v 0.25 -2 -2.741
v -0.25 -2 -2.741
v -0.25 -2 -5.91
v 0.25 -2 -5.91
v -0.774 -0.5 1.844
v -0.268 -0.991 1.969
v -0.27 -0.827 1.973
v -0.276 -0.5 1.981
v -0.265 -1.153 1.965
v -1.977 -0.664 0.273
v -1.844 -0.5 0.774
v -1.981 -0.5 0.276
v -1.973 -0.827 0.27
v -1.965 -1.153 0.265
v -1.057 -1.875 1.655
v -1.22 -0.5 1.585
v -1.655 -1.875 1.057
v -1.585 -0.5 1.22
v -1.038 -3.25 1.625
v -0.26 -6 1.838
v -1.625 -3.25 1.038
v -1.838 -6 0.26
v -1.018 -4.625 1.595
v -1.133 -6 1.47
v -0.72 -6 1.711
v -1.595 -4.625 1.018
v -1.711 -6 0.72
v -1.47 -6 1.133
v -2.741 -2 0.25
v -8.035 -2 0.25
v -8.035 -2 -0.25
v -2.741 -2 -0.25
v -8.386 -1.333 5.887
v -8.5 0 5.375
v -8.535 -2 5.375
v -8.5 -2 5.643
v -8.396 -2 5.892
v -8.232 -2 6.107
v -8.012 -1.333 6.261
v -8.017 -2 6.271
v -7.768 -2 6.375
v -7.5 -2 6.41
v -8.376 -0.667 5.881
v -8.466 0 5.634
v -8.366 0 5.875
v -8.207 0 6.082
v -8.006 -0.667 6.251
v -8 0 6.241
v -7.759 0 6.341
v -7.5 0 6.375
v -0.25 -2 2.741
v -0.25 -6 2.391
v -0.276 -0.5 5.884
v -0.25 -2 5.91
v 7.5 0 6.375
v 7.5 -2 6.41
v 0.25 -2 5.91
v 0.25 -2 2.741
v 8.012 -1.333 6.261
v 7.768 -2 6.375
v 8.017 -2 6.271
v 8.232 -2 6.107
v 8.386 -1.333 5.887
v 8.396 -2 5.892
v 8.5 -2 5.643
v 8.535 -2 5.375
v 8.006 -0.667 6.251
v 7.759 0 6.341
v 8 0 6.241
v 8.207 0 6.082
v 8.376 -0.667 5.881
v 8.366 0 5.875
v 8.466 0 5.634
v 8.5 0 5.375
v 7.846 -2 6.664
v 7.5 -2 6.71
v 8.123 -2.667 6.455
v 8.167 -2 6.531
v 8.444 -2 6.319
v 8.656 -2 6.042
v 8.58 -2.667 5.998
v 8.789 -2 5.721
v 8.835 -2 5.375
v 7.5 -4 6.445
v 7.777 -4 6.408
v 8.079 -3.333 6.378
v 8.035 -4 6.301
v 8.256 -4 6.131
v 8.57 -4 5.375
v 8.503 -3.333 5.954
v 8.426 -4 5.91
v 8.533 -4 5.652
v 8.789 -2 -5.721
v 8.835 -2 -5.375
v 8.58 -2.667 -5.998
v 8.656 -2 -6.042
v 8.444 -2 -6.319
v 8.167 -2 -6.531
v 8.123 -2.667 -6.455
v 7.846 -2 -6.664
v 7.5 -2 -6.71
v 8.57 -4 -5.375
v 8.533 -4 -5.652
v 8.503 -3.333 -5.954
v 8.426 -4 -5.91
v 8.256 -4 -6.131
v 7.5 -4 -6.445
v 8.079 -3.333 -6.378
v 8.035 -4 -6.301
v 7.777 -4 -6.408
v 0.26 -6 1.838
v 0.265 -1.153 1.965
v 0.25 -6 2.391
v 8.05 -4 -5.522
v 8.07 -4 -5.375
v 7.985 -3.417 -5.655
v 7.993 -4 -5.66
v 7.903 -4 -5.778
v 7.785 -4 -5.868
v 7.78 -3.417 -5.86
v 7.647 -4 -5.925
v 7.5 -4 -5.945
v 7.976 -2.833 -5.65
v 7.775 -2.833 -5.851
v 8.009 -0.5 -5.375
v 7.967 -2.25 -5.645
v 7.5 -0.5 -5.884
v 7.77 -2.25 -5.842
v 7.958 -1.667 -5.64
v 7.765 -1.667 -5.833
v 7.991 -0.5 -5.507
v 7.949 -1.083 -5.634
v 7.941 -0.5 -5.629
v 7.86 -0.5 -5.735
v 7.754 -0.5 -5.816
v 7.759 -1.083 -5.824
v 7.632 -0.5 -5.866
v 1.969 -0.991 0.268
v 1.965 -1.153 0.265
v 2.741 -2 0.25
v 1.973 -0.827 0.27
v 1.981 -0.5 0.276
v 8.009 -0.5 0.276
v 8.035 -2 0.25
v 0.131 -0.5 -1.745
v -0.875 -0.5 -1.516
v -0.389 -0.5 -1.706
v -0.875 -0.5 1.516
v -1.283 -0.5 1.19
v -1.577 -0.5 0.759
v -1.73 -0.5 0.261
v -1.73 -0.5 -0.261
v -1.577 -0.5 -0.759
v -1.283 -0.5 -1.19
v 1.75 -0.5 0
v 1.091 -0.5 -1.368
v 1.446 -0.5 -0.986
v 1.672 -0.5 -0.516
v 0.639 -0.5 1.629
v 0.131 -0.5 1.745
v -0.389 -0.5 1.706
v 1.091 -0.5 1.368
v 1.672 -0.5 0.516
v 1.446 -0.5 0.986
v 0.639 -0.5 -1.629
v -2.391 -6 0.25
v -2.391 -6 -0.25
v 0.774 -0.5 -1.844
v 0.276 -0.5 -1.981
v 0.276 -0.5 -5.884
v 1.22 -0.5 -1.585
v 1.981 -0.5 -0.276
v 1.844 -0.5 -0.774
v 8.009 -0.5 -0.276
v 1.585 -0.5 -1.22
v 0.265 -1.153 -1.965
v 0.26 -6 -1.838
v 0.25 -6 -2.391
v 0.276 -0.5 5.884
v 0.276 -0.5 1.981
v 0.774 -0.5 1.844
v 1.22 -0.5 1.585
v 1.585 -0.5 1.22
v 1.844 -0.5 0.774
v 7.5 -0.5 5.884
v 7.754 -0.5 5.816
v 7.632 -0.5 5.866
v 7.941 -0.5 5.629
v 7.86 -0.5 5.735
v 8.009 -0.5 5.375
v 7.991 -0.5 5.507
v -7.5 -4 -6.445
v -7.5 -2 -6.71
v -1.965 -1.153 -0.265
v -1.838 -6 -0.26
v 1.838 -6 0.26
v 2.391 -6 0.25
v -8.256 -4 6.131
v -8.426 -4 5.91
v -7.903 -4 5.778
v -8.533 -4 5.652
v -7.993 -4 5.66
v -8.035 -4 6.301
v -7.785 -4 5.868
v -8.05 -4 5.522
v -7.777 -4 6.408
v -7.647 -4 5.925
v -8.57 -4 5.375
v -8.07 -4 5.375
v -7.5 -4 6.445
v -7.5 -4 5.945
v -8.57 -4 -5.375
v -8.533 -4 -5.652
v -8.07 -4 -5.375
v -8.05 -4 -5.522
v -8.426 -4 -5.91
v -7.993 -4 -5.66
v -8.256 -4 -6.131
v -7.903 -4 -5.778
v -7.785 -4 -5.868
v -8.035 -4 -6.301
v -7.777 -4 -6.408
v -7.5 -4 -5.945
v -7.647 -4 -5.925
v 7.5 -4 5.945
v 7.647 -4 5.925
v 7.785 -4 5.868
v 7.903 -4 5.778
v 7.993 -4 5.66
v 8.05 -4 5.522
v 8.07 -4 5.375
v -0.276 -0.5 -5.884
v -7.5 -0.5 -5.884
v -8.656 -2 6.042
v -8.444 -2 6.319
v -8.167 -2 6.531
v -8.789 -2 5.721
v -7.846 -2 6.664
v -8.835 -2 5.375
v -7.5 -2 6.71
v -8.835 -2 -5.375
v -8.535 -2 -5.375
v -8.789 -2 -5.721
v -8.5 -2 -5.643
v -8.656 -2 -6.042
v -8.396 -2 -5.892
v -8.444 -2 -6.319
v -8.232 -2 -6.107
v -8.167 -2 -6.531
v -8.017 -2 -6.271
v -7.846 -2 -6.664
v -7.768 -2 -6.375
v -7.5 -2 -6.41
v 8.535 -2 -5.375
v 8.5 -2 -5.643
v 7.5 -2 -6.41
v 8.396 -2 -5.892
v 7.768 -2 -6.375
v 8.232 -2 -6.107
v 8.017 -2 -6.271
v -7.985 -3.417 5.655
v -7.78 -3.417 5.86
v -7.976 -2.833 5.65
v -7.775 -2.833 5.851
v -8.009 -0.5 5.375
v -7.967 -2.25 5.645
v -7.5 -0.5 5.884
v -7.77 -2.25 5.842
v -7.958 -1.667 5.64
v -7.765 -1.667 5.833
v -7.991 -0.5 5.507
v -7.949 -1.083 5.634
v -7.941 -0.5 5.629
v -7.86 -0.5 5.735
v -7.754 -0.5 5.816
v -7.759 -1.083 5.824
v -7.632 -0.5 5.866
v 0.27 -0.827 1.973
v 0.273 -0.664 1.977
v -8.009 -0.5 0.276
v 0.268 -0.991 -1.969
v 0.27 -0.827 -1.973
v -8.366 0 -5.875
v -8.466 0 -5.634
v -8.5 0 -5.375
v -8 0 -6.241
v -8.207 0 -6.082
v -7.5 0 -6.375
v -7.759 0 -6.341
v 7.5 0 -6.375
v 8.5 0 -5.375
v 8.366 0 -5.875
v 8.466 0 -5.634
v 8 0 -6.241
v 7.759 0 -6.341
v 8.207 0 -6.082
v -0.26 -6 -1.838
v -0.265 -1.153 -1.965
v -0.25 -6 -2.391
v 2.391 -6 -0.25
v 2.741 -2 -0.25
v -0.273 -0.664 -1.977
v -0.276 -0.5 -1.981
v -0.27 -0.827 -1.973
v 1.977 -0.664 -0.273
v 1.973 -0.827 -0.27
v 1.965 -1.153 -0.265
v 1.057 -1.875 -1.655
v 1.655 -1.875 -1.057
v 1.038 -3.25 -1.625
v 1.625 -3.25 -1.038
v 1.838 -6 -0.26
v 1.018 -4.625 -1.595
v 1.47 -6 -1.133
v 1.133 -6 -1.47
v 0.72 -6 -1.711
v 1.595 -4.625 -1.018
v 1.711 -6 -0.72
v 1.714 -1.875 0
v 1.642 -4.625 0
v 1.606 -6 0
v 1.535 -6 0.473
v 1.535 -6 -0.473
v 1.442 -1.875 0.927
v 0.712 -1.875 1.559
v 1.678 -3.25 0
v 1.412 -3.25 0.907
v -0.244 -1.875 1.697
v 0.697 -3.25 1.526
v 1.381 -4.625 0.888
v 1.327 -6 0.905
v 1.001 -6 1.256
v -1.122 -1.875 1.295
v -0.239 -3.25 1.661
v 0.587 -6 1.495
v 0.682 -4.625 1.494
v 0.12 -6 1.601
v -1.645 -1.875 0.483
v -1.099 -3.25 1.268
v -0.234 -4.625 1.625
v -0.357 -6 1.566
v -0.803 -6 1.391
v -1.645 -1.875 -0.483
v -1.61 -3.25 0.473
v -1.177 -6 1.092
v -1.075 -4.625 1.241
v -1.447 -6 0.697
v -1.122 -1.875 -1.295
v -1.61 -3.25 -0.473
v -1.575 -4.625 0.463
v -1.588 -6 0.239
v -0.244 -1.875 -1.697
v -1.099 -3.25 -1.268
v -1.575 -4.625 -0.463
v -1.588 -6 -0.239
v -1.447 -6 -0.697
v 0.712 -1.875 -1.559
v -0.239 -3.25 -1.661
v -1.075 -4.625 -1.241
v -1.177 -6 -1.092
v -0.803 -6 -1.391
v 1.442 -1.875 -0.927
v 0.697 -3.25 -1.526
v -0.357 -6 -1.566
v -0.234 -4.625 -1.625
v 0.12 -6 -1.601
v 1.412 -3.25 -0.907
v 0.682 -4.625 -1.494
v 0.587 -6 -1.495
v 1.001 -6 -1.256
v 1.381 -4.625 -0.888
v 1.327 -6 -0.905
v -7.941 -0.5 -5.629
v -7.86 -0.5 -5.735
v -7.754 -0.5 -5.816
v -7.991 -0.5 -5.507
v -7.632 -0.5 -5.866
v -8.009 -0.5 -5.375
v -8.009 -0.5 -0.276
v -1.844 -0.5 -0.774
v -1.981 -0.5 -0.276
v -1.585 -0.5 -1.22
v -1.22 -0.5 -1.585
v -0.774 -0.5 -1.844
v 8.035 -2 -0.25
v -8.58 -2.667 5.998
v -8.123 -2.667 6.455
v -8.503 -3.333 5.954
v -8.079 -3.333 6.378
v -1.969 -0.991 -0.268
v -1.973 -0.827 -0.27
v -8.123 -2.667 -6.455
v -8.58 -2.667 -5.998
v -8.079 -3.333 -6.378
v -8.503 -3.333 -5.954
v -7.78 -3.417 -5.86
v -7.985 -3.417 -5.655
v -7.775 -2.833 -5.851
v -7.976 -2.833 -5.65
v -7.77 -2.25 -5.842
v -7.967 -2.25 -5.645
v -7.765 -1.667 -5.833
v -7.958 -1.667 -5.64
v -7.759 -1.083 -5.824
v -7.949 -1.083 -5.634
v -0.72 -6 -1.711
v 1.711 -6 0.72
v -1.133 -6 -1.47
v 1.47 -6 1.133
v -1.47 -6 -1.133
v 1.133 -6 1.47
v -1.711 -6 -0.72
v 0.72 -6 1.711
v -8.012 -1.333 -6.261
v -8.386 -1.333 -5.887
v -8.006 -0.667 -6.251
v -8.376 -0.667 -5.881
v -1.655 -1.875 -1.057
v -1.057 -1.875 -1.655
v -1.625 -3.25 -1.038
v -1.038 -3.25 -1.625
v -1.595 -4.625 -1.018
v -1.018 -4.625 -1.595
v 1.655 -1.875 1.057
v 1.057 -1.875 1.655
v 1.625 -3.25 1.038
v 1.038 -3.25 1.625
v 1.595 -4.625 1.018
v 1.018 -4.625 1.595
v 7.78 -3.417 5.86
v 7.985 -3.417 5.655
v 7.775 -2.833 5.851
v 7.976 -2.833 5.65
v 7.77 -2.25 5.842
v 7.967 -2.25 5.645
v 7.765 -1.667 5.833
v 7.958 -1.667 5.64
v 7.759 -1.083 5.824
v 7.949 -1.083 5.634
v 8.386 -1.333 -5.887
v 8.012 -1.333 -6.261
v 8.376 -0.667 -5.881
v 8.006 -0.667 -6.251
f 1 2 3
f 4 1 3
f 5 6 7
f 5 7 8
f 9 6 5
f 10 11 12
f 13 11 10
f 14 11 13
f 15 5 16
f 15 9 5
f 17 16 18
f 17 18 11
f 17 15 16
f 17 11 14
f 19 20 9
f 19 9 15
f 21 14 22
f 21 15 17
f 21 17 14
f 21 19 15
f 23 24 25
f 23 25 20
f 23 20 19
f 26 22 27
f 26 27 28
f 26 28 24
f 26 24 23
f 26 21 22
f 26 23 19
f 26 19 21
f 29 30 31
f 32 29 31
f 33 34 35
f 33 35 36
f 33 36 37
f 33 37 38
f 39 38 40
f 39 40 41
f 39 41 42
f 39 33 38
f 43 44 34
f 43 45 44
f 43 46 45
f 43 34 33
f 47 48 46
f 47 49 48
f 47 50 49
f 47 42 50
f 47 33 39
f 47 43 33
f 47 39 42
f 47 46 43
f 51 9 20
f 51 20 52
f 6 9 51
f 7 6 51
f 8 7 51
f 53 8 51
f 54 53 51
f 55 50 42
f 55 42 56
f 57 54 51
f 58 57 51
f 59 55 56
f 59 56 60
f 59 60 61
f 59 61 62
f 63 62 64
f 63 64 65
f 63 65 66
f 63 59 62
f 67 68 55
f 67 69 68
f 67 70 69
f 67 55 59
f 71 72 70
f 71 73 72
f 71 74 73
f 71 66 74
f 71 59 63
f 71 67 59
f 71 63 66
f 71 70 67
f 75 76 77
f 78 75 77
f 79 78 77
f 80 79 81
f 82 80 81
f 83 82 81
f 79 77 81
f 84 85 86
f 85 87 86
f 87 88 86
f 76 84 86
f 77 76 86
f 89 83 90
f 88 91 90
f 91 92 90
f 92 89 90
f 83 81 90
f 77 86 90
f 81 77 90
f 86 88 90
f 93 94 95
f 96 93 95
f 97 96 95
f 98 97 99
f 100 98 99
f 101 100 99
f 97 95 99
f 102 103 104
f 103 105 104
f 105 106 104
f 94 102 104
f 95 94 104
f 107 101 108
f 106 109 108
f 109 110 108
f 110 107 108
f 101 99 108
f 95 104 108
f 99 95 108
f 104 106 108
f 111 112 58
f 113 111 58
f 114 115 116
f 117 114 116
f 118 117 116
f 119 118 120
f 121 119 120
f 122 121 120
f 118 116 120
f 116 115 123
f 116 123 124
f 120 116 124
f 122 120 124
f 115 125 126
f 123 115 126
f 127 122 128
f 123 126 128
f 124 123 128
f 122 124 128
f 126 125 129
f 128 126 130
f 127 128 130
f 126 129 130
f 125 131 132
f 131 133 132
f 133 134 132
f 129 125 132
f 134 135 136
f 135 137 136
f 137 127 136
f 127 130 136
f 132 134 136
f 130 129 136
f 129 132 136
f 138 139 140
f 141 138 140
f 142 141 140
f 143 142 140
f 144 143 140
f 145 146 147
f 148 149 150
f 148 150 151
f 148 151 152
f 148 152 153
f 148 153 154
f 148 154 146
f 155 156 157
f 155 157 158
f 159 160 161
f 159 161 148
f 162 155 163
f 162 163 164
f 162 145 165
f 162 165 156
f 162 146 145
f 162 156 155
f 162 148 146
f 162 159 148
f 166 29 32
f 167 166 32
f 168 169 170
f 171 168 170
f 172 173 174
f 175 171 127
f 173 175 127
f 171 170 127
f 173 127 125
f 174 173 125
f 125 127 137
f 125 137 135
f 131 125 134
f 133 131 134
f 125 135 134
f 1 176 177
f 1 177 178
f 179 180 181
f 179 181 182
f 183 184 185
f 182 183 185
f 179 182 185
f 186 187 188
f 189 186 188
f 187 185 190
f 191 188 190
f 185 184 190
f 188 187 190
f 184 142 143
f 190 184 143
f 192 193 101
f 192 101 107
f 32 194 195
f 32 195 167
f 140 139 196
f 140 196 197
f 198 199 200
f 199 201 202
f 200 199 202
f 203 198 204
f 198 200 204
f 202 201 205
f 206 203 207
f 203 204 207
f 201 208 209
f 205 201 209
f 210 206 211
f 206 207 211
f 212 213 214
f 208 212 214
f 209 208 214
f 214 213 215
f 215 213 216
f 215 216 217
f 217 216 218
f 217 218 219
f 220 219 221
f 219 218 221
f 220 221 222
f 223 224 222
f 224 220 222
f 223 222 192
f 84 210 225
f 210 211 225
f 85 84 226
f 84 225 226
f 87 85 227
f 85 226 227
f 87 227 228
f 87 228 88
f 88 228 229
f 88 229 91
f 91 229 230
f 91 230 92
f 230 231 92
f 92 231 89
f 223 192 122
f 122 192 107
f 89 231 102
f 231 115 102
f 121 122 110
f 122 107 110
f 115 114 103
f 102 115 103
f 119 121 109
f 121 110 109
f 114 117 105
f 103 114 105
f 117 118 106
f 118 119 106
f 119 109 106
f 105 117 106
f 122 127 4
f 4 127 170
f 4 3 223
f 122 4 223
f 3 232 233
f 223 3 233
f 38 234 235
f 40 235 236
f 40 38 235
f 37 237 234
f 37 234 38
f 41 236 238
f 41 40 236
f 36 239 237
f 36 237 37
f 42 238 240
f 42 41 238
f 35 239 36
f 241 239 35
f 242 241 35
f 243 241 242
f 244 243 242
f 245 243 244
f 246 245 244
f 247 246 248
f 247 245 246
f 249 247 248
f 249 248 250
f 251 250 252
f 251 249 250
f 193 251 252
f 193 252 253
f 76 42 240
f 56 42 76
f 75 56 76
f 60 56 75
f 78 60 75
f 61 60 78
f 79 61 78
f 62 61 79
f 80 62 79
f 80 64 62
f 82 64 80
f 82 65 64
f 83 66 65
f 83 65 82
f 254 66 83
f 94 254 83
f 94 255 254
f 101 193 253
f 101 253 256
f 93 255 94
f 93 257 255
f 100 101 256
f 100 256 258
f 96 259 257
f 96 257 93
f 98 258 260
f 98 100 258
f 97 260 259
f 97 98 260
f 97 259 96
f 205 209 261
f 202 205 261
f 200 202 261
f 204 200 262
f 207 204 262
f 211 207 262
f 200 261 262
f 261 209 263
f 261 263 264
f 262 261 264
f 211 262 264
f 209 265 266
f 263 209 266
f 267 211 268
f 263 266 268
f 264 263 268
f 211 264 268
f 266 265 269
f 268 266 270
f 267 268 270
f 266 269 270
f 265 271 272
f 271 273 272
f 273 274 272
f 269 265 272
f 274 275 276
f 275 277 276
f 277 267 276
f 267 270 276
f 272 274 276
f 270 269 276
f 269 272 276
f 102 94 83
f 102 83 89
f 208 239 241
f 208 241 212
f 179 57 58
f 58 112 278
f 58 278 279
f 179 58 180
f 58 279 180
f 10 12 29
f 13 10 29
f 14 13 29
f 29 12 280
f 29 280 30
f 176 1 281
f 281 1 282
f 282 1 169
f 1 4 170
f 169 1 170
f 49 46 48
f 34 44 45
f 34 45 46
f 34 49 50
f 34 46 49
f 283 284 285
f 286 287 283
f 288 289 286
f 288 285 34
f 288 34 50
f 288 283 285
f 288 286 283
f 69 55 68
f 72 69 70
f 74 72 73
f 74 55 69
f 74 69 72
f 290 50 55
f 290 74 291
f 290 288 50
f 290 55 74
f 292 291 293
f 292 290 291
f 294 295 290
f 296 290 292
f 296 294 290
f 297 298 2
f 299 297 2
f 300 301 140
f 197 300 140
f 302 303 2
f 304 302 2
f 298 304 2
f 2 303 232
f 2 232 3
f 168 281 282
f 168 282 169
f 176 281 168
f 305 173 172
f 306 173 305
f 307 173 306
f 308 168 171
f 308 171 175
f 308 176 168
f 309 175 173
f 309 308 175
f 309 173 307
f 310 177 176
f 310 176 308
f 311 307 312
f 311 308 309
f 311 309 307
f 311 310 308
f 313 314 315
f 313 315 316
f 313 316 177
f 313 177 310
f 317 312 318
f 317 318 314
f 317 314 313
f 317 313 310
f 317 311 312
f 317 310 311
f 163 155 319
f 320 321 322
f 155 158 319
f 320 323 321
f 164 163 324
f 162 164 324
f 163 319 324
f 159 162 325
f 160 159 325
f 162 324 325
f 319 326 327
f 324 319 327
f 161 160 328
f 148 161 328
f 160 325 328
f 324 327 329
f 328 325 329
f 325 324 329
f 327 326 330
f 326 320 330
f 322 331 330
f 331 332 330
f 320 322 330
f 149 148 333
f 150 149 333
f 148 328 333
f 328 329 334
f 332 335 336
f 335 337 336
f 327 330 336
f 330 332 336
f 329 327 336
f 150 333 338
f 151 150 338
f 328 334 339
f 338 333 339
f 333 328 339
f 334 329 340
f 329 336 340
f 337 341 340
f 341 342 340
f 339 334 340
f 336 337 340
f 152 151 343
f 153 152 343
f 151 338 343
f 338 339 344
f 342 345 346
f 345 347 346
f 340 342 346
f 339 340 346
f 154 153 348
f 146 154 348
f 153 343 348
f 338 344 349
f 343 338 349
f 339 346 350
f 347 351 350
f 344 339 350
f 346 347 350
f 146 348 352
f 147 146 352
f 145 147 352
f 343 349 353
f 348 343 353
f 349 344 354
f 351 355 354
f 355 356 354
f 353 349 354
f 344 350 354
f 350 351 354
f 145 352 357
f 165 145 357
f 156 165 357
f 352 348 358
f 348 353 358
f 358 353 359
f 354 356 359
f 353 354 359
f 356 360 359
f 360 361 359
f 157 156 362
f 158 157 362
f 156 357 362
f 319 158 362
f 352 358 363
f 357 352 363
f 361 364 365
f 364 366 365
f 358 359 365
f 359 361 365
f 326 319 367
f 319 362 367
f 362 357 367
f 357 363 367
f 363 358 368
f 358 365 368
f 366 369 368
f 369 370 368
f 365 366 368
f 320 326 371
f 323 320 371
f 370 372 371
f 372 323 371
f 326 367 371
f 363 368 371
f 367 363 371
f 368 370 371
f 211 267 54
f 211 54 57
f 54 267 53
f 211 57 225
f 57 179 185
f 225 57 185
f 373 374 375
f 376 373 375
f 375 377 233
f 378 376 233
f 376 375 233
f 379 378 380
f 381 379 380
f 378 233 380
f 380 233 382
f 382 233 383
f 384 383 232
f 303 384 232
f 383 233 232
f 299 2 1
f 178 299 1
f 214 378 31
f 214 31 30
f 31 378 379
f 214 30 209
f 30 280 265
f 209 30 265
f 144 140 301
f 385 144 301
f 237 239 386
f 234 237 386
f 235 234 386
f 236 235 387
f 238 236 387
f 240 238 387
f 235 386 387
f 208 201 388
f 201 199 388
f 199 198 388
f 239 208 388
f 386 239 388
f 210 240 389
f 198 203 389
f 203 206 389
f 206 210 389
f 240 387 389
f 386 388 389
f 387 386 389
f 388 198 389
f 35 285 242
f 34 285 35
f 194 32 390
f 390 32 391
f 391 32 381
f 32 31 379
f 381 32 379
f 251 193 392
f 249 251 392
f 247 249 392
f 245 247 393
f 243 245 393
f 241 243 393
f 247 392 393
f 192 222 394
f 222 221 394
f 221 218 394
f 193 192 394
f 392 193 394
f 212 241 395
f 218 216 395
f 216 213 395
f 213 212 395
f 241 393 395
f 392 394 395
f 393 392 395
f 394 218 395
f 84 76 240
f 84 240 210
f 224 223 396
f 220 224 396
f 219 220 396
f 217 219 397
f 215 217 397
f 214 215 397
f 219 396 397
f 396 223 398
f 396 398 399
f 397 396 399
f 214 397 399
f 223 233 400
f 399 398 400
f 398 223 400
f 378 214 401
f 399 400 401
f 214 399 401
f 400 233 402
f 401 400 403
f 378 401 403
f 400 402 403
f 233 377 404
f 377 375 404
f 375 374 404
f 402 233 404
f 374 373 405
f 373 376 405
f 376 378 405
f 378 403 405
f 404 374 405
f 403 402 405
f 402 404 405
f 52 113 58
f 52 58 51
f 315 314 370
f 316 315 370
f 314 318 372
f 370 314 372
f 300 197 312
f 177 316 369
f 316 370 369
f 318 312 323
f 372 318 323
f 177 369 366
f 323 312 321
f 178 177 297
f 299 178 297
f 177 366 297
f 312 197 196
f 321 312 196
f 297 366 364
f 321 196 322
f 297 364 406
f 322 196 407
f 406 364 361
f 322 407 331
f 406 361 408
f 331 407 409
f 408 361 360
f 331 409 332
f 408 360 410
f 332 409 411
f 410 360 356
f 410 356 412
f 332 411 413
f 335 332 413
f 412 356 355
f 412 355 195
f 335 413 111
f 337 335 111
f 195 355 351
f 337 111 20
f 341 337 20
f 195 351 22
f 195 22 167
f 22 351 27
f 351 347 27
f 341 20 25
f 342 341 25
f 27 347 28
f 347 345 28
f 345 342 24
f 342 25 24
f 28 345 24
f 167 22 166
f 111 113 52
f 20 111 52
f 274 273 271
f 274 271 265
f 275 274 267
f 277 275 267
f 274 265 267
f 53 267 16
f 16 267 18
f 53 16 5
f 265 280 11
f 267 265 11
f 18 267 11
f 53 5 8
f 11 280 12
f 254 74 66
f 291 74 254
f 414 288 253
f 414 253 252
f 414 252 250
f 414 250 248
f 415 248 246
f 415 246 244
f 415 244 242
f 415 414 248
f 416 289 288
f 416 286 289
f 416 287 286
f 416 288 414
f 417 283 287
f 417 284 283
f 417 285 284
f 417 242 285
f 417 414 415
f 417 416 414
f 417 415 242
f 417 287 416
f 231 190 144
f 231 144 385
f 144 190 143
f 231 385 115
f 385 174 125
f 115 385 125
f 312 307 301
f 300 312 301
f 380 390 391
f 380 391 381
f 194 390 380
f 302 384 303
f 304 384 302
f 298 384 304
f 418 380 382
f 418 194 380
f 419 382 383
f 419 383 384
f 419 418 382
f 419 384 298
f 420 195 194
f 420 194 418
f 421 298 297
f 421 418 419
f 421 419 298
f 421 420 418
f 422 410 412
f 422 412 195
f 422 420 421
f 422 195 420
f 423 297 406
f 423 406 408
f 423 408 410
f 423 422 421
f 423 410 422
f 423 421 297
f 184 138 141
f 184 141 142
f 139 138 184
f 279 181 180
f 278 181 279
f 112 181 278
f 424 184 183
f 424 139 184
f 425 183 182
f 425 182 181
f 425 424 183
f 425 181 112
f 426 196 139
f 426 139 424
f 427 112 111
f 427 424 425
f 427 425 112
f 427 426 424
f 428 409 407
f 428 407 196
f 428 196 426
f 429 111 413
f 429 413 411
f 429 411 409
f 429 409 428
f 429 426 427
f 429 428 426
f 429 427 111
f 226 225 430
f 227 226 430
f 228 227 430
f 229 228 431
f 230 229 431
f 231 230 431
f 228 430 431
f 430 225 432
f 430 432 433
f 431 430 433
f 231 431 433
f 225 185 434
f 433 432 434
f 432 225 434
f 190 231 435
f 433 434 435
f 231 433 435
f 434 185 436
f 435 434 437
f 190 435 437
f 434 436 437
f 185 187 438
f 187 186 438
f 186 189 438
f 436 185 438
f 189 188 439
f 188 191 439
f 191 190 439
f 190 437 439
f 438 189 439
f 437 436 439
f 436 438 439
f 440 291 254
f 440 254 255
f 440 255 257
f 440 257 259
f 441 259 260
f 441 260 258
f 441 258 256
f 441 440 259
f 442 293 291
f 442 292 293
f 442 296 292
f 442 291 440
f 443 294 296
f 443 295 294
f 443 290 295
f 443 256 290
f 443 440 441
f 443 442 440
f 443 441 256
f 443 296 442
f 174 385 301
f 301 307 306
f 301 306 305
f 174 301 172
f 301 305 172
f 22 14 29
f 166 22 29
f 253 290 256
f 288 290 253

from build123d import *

# Parameters (mm, degrees)
BOSS_EXTRUDE1_DEPTH = 4
BOSS_EXTRUDE1_DRAFT = 1
SHELL1_T            = -0.5
SKETCH2_R           = 2
BOSS_EXTRUDE2_DEPTH = 5.5
BOSS_EXTRUDE2_TAPER = 1.5
CIRPATTERN1_COUNT   = 4
SKETCH4_R           = 1.605977431
CUT_EXTRUDE1_DEPTH  = 5.5
CUT_EXTRUDE1_DRAFT  = 1.5
RIB2_START          = -8.069744096
RIB2_DEPTH          = 6.232014751
RIB2_START_2        = 1.837729345
RIB2_2_DEPTH        = 6.232014751
RIB2_START_3        = -0.25
RIB2_3_DEPTH        = 0.4999999
RIB2_START_4        = -5.909834066
RIB2_4_DEPTH        = 4.072104721
RIB2_5_DEPTH        = 4.072104621


with BuildPart() as part:
    # Sketch1 → Boss-Extrude1 (with draft: the straight prism first)
    with BuildSketch(Plane(origin=(0, 0, 0), x_dir=(1, 0, 0), z_dir=(0, 1, 0))):
        with BuildLine():
            Line((-7.5, -6.375), (7.5, -6.375))
            ThreePointArc((7.5, -6.375), (8.207106781, -6.082106781), (8.5, -5.375))
            Line((8.5, -5.375), (8.5, 5.375))
            ThreePointArc((8.5, 5.375), (8.207106781, 6.082106781), (7.5, 6.375))
            Line((7.5, 6.375), (-7.5, 6.375))
            ThreePointArc((-7.5, 6.375), (-8.207106781, 6.082106781), (-8.5, 5.375))
            Line((-8.5, 5.375), (-8.5, -5.375))
            ThreePointArc((-8.5, -5.375), (-8.207106781, -6.082106781), (-7.5, -6.375))
        make_face()
    extrude(amount=-BOSS_EXTRUDE1_DEPTH)
    # Boss-Extrude1: the draft: its side faces are tilted about the plane it starts from
    boss_extrude1_sides = [part.faces().sort_by_distance(p)[0] for p in [
        (0, -2, 6.375),
        (8.207106781, -2, 6.082106781),
        (8.5, -2, 0),
        (8.207106781, -2, -6.082106781),
        (0, -2, -6.375),
        (-8.207106781, -2, -6.082106781),
        (-8.5, -2, 0),
        (-8.207106781, -2, 6.082106781),
    ]]
    draft(boss_extrude1_sides, Plane(origin=(0, 0, 0), x_dir=(1, 0, 0), z_dir=(0, 1, 0)), BOSS_EXTRUDE1_DRAFT)

    # Shell1
    shell1_openings = [part.faces().sort_by_distance(p)[0] for p in [
        (0, -4, 0),
    ]]
    offset(amount=SHELL1_T, openings=shell1_openings, kind=Kind.INTERSECTION)

    # Sketch2 → Boss-Extrude2 (add)
    with BuildSketch(Plane.XZ.offset(0.5)):
        Circle(SKETCH2_R)
    extrude(amount=BOSS_EXTRUDE2_DEPTH, taper=BOSS_EXTRUDE2_TAPER)

    # Rib1: read off the stored shape, not the designer's step
    # Rib1: loft between two sections, ruled curve by curve
    rib1_from = [
        Edge.make_line((1.982302644, -0.5, 0.265473592), (2.872170331, -0.5, 0.25)),
        Edge.make_line((1.982302644, -0.5, -0.265473592), (2.872170331, -0.5, -0.25)),
        Edge.make_line((2.872170331, -0.5, -0.25), (2.872170331, -0.5, 0.25)),
        Edge.make_line((1.982302644, -0.5, -0.265473592), (1.982302644, -0.5, 0.265473592)),
    ]
    rib1_to = [
        Edge.make_line((1.837729445, -6, 0.259620323), (2.390982681, -6, 0.25)),
        Edge.make_line((1.837729445, -6, -0.259620323), (2.390982681, -6, -0.25)),
        Edge.make_line((2.390982681, -6, -0.25), (2.390982681, -6, 0.25)),
        Edge.make_line((1.837729445, -6, -0.259620323), (1.837729445, -6, 0.259620323)),
    ]
    rib1 = Solid(Shell([*[Face.make_surface_from_curves(rib1_from[k], rib1_to[k]) for k in range(4)], Face(Wire(rib1_from)), Face(Wire(rib1_to))]))
    add(rib1)

    # CirPattern1: Rib1 ×4 about axis
    cirpattern1_axis = Axis((0, 0, 0), (0, 1, 0))
    for i in range(1, CIRPATTERN1_COUNT):
        add(rib1.rotate(cirpattern1_axis, i * 360 / CIRPATTERN1_COUNT))


with BuildPart() as cut_extrude1_tool:
    # Sketch4 → Cut-Extrude1 (with draft: the straight prism first)
    with BuildSketch(Plane.XZ.offset(6)):
        Circle(SKETCH4_R)
    extrude(amount=-CUT_EXTRUDE1_DEPTH)
    # Cut-Extrude1: the draft: its side faces are tilted about the plane it starts from
    cut_extrude1_sides = [cut_extrude1_tool.faces().sort_by_distance(p)[0] for p in [
        (-1.605977431, -3.25, 0),
    ]]
    draft(cut_extrude1_sides, Plane.XZ.offset(6), CUT_EXTRUDE1_DRAFT)


with BuildPart() as part_1:
    add(part.part)

    # Cut-Extrude1: cut by cut_extrude1_tool
    add(cut_extrude1_tool.part, mode=Mode.SUBTRACT)

    # Sweep1: sweep along a path in Sketch6
    with BuildLine(Plane(origin=(0, -2, 0), x_dir=(1, 0, 0), z_dir=(0, 1, 0))) as sweep1_path:
        Line((8.56982026, -5.375), (8.56982026, 5.375))
        ThreePointArc((8.56982026, 5.375), (8.25647716, 6.13147716), (7.5, 6.44482026))
        Line((7.5, 6.44482026), (-7.5, 6.44482026))
        ThreePointArc((-7.5, 6.44482026), (-8.25647716, 6.13147716), (-8.56982026, 5.375))
        Line((-8.56982026, 5.375), (-8.56982026, -5.375))
        ThreePointArc((-8.56982026, -5.375), (-8.25647716, -6.13147716), (-7.5, -6.44482026))
        Line((-7.5, -6.44482026), (7.5, -6.44482026))
        ThreePointArc((7.5, -6.44482026), (8.25647716, -6.13147716), (8.56982026, -5.375))
    # Sketch5 → Sweep1 (sweep)
    with BuildSketch(Plane(origin=(0, 0, 0), x_dir=(0, 0, -1), z_dir=(1, 0, 0))):
        Polygon((-6.70991013, -2), (-6.44482026, -4), (-6.40991013, -2), align=None)
    sweep(path=sweep1_path.line)

    # Rib2: read off the stored shape, not the designer's step
    # Rib2 outline → Rib2 (add)
    with BuildSketch(Plane.YZ.offset(RIB2_START)):
        Polygon((-0.5, 0.276182597), (-2, 0.25), (-2, -0.25), (-0.5, -0.276182597), align=None)
    extrude(amount=RIB2_DEPTH)

    # Rib2 2 outline → Rib2 2 (add)
    with BuildSketch(Plane.YZ.offset(RIB2_START_2)):
        Polygon((-0.5, 0.276182597), (-2, 0.25), (-2, -0.25), (-0.5, -0.276182597), align=None)
    extrude(amount=RIB2_2_DEPTH)

    # Rib2 3 outline → Rib2 3 (add)
    with BuildSketch(Plane.YZ.offset(RIB2_START_3)):
        Polygon((-2, 2.740937336), (-0.5, 2.872170331), (-0.5, 5.883651368), (-2, 5.909833966), align=None)
        Polygon((-0.5, -5.883651368), (-0.5, -2.872170331), (-2, -2.740937336), (-2, -5.909833966), align=None)
    extrude(amount=RIB2_3_DEPTH)

    # Rib2 4 outline → Rib2 4 (add)
    with BuildSketch(Plane.XY.offset(RIB2_START_4)):
        Polygon((0.25, -2), (0.276182597, -0.5), (0.2499999, -0.5), align=None)
        Polygon((-0.276182597, -0.5), (-0.25, -2), (-0.25, -0.5), align=None)
    extrude(amount=RIB2_4_DEPTH)

    # Rib2 5 outline → Rib2 5 (add)
    with BuildSketch(Plane.XY.offset(RIB2_START_2)):
        Polygon((0.25, -2), (0.276182597, -0.5), (0.2499999, -0.5), align=None)
        Polygon((-0.276182597, -0.5), (-0.25, -2), (-0.25, -0.5), align=None)
    extrude(amount=RIB2_5_DEPTH)


solid = part_1.part
